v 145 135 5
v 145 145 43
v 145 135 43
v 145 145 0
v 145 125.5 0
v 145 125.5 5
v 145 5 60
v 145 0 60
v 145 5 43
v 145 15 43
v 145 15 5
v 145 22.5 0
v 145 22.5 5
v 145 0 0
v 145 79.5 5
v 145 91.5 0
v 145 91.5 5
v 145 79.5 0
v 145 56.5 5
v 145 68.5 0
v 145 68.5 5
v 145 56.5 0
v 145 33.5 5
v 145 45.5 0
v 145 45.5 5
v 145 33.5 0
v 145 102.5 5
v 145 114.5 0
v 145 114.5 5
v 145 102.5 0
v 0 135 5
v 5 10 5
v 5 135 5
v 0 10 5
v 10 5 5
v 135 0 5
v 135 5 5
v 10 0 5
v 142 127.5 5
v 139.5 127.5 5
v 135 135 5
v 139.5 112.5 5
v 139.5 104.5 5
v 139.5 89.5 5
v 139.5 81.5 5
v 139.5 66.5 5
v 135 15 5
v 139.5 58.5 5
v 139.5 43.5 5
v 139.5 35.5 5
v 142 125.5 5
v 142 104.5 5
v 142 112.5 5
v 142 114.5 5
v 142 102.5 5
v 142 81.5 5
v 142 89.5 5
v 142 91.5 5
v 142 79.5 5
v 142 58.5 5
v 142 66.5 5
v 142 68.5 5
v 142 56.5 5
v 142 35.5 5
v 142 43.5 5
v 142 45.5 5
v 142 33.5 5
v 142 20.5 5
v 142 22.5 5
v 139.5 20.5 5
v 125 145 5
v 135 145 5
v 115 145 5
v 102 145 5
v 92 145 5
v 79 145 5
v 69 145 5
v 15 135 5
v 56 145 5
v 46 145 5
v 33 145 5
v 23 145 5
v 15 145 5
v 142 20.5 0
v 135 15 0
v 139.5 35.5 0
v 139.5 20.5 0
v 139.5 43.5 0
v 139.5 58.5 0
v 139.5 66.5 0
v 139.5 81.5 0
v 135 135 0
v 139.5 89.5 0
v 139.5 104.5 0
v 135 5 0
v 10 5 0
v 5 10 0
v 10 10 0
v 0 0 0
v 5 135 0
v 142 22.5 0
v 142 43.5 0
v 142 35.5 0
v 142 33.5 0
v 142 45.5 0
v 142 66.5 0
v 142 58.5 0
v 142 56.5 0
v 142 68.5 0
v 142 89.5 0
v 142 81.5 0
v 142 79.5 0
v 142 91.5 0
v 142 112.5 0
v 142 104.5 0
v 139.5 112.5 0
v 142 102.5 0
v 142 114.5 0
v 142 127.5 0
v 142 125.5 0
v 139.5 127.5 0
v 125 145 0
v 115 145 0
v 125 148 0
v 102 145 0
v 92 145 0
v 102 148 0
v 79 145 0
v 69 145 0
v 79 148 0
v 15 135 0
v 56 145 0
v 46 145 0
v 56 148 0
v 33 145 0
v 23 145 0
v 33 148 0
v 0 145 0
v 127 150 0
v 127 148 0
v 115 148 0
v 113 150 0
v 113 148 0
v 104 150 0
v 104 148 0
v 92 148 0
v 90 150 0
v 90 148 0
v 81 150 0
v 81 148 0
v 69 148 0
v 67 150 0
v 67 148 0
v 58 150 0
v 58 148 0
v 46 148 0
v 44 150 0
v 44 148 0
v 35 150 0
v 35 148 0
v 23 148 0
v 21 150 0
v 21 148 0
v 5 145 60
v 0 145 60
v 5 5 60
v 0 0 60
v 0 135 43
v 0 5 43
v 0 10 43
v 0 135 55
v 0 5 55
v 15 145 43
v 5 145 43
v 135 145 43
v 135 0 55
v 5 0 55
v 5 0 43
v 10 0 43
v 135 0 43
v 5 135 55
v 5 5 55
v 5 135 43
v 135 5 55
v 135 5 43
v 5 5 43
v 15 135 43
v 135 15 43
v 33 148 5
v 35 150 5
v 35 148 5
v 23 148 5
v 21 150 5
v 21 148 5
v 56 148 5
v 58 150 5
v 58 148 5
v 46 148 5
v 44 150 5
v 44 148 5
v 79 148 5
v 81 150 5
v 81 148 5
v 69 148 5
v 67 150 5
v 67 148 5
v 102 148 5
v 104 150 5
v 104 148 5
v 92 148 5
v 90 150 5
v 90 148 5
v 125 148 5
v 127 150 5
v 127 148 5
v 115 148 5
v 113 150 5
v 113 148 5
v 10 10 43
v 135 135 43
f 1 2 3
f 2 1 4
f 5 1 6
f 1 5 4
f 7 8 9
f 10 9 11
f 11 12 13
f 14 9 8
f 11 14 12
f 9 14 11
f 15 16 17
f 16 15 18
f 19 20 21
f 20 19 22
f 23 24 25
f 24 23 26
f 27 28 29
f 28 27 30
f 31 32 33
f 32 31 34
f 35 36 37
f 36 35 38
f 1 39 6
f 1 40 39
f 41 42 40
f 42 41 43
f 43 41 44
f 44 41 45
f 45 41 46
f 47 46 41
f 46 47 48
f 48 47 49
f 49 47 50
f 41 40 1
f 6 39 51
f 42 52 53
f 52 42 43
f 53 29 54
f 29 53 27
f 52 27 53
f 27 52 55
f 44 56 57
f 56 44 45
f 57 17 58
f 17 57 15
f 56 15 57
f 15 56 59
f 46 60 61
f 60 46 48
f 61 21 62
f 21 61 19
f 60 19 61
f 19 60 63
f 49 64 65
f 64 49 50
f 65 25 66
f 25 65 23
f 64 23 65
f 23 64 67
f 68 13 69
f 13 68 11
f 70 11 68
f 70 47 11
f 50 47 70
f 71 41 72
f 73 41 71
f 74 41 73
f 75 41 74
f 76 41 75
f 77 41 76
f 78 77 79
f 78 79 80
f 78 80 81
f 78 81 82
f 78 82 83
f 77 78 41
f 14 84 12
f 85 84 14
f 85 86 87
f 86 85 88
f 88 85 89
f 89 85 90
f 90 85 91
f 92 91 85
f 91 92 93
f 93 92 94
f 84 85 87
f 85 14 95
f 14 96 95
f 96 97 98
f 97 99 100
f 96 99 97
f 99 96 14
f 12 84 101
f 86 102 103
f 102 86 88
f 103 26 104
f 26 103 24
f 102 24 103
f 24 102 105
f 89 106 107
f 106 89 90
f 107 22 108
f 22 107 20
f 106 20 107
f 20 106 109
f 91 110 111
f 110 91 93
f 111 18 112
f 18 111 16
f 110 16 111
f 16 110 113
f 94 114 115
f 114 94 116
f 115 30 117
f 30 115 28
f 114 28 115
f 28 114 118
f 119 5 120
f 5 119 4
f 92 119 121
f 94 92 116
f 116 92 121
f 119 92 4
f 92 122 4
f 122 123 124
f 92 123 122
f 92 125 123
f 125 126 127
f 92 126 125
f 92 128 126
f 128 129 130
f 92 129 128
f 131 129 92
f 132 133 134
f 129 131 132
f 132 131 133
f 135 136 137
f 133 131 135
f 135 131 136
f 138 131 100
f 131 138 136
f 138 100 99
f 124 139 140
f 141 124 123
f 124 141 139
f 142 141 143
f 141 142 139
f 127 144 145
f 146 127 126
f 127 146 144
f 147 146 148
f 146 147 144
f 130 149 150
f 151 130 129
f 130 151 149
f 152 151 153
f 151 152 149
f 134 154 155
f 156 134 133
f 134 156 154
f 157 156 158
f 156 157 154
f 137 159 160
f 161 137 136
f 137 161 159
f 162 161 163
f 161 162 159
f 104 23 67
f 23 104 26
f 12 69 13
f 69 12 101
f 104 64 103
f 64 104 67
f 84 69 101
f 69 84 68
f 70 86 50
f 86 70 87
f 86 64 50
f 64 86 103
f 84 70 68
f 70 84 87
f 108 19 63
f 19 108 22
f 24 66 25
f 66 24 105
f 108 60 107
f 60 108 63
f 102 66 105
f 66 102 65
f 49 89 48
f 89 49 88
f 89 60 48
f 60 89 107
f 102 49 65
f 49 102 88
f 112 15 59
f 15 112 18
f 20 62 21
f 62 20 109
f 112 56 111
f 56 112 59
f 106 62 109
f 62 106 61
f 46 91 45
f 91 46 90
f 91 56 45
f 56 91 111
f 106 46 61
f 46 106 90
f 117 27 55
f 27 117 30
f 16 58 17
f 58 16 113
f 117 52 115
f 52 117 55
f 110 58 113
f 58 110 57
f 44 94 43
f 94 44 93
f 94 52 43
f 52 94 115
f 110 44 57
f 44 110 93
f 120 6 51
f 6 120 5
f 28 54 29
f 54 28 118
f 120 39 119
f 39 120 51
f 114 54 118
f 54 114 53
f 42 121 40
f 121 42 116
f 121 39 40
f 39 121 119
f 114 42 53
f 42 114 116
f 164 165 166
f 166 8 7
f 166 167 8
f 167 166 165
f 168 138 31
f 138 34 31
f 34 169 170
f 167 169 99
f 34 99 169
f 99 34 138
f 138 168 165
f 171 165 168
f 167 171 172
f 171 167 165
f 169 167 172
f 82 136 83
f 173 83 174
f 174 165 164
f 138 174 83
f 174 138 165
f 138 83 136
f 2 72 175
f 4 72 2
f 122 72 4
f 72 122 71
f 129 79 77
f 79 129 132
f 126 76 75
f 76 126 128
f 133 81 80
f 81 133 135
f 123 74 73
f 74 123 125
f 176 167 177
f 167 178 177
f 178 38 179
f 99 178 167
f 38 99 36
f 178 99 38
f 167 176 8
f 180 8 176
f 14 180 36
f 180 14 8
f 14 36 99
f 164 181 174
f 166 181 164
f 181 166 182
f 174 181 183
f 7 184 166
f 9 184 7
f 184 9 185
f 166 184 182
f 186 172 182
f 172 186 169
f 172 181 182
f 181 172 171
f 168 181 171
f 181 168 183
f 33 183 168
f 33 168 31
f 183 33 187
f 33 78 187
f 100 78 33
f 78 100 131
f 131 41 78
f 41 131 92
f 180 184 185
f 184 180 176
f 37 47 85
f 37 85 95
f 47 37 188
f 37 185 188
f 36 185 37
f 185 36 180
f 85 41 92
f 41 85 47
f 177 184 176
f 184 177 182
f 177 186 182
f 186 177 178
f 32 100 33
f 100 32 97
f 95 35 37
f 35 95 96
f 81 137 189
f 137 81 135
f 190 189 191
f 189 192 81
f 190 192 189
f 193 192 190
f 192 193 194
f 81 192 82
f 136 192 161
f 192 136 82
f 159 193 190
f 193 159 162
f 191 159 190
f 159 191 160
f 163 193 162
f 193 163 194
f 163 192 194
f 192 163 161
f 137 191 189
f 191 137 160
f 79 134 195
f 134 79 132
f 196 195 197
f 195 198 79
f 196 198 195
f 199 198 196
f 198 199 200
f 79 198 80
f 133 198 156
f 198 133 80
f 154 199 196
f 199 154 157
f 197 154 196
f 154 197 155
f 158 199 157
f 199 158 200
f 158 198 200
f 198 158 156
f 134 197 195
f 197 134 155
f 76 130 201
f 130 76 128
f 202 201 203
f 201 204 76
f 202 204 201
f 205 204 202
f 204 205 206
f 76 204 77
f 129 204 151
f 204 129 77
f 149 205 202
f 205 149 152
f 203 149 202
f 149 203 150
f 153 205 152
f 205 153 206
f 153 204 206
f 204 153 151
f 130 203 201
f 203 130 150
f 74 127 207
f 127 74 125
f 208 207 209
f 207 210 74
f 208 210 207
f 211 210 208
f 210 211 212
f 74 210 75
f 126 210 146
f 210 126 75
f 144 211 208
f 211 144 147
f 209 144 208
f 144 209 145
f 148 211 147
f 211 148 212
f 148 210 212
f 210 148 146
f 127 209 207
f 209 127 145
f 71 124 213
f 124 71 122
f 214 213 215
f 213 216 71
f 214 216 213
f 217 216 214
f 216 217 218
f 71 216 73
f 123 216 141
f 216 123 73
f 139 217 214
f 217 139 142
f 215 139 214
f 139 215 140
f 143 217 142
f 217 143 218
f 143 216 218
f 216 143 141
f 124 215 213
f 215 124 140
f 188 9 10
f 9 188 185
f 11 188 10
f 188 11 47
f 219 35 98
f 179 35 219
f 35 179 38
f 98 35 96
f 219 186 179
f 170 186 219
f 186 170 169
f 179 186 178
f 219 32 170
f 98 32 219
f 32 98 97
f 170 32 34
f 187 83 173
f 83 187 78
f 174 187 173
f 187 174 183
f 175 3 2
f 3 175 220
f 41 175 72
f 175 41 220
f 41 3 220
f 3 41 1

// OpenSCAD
// roof is ~75mm
// fan is ~27mm tall
// put fan at 43mm, leaves 5mm
difference(){
    cube([145,145,60]);
    translate([5,5,5]){
        cube([140,140,70]);
    }
    translate([0, 5, 5]){
        cube([5, 130, 50]);
    }
    translate([5, 0, 5]){
        cube([130, 5, 50]);
    }
    translate([5, 5, 0]){
       cube([130, 130, 5]);
    }
    for(i = [1:5]){
        translate([140, i * 23 - .5, 0]){
            cube([5, 11, 5]);
        }
        translate([139.5, i * 23 - 2.5, 0]){
            cube([2.5, 15, 5]);
        }
    }
}
translate([135,0,0]){
    cube([10, 15, 43]);
}
cube([10,10,43]);
translate([0, 135, 0]){
    cube([15,10,43]);
}
translate([135,135,0]){
    cube([10,10,43]);
}
for(i = [1:5]){
    translate([i * 23, 145, 0]){
        cube([10, 5, 5]);
    }
    translate([i * 23 - 2, 148, 0]){
        cube([14, 2, 5]);
    }
}
